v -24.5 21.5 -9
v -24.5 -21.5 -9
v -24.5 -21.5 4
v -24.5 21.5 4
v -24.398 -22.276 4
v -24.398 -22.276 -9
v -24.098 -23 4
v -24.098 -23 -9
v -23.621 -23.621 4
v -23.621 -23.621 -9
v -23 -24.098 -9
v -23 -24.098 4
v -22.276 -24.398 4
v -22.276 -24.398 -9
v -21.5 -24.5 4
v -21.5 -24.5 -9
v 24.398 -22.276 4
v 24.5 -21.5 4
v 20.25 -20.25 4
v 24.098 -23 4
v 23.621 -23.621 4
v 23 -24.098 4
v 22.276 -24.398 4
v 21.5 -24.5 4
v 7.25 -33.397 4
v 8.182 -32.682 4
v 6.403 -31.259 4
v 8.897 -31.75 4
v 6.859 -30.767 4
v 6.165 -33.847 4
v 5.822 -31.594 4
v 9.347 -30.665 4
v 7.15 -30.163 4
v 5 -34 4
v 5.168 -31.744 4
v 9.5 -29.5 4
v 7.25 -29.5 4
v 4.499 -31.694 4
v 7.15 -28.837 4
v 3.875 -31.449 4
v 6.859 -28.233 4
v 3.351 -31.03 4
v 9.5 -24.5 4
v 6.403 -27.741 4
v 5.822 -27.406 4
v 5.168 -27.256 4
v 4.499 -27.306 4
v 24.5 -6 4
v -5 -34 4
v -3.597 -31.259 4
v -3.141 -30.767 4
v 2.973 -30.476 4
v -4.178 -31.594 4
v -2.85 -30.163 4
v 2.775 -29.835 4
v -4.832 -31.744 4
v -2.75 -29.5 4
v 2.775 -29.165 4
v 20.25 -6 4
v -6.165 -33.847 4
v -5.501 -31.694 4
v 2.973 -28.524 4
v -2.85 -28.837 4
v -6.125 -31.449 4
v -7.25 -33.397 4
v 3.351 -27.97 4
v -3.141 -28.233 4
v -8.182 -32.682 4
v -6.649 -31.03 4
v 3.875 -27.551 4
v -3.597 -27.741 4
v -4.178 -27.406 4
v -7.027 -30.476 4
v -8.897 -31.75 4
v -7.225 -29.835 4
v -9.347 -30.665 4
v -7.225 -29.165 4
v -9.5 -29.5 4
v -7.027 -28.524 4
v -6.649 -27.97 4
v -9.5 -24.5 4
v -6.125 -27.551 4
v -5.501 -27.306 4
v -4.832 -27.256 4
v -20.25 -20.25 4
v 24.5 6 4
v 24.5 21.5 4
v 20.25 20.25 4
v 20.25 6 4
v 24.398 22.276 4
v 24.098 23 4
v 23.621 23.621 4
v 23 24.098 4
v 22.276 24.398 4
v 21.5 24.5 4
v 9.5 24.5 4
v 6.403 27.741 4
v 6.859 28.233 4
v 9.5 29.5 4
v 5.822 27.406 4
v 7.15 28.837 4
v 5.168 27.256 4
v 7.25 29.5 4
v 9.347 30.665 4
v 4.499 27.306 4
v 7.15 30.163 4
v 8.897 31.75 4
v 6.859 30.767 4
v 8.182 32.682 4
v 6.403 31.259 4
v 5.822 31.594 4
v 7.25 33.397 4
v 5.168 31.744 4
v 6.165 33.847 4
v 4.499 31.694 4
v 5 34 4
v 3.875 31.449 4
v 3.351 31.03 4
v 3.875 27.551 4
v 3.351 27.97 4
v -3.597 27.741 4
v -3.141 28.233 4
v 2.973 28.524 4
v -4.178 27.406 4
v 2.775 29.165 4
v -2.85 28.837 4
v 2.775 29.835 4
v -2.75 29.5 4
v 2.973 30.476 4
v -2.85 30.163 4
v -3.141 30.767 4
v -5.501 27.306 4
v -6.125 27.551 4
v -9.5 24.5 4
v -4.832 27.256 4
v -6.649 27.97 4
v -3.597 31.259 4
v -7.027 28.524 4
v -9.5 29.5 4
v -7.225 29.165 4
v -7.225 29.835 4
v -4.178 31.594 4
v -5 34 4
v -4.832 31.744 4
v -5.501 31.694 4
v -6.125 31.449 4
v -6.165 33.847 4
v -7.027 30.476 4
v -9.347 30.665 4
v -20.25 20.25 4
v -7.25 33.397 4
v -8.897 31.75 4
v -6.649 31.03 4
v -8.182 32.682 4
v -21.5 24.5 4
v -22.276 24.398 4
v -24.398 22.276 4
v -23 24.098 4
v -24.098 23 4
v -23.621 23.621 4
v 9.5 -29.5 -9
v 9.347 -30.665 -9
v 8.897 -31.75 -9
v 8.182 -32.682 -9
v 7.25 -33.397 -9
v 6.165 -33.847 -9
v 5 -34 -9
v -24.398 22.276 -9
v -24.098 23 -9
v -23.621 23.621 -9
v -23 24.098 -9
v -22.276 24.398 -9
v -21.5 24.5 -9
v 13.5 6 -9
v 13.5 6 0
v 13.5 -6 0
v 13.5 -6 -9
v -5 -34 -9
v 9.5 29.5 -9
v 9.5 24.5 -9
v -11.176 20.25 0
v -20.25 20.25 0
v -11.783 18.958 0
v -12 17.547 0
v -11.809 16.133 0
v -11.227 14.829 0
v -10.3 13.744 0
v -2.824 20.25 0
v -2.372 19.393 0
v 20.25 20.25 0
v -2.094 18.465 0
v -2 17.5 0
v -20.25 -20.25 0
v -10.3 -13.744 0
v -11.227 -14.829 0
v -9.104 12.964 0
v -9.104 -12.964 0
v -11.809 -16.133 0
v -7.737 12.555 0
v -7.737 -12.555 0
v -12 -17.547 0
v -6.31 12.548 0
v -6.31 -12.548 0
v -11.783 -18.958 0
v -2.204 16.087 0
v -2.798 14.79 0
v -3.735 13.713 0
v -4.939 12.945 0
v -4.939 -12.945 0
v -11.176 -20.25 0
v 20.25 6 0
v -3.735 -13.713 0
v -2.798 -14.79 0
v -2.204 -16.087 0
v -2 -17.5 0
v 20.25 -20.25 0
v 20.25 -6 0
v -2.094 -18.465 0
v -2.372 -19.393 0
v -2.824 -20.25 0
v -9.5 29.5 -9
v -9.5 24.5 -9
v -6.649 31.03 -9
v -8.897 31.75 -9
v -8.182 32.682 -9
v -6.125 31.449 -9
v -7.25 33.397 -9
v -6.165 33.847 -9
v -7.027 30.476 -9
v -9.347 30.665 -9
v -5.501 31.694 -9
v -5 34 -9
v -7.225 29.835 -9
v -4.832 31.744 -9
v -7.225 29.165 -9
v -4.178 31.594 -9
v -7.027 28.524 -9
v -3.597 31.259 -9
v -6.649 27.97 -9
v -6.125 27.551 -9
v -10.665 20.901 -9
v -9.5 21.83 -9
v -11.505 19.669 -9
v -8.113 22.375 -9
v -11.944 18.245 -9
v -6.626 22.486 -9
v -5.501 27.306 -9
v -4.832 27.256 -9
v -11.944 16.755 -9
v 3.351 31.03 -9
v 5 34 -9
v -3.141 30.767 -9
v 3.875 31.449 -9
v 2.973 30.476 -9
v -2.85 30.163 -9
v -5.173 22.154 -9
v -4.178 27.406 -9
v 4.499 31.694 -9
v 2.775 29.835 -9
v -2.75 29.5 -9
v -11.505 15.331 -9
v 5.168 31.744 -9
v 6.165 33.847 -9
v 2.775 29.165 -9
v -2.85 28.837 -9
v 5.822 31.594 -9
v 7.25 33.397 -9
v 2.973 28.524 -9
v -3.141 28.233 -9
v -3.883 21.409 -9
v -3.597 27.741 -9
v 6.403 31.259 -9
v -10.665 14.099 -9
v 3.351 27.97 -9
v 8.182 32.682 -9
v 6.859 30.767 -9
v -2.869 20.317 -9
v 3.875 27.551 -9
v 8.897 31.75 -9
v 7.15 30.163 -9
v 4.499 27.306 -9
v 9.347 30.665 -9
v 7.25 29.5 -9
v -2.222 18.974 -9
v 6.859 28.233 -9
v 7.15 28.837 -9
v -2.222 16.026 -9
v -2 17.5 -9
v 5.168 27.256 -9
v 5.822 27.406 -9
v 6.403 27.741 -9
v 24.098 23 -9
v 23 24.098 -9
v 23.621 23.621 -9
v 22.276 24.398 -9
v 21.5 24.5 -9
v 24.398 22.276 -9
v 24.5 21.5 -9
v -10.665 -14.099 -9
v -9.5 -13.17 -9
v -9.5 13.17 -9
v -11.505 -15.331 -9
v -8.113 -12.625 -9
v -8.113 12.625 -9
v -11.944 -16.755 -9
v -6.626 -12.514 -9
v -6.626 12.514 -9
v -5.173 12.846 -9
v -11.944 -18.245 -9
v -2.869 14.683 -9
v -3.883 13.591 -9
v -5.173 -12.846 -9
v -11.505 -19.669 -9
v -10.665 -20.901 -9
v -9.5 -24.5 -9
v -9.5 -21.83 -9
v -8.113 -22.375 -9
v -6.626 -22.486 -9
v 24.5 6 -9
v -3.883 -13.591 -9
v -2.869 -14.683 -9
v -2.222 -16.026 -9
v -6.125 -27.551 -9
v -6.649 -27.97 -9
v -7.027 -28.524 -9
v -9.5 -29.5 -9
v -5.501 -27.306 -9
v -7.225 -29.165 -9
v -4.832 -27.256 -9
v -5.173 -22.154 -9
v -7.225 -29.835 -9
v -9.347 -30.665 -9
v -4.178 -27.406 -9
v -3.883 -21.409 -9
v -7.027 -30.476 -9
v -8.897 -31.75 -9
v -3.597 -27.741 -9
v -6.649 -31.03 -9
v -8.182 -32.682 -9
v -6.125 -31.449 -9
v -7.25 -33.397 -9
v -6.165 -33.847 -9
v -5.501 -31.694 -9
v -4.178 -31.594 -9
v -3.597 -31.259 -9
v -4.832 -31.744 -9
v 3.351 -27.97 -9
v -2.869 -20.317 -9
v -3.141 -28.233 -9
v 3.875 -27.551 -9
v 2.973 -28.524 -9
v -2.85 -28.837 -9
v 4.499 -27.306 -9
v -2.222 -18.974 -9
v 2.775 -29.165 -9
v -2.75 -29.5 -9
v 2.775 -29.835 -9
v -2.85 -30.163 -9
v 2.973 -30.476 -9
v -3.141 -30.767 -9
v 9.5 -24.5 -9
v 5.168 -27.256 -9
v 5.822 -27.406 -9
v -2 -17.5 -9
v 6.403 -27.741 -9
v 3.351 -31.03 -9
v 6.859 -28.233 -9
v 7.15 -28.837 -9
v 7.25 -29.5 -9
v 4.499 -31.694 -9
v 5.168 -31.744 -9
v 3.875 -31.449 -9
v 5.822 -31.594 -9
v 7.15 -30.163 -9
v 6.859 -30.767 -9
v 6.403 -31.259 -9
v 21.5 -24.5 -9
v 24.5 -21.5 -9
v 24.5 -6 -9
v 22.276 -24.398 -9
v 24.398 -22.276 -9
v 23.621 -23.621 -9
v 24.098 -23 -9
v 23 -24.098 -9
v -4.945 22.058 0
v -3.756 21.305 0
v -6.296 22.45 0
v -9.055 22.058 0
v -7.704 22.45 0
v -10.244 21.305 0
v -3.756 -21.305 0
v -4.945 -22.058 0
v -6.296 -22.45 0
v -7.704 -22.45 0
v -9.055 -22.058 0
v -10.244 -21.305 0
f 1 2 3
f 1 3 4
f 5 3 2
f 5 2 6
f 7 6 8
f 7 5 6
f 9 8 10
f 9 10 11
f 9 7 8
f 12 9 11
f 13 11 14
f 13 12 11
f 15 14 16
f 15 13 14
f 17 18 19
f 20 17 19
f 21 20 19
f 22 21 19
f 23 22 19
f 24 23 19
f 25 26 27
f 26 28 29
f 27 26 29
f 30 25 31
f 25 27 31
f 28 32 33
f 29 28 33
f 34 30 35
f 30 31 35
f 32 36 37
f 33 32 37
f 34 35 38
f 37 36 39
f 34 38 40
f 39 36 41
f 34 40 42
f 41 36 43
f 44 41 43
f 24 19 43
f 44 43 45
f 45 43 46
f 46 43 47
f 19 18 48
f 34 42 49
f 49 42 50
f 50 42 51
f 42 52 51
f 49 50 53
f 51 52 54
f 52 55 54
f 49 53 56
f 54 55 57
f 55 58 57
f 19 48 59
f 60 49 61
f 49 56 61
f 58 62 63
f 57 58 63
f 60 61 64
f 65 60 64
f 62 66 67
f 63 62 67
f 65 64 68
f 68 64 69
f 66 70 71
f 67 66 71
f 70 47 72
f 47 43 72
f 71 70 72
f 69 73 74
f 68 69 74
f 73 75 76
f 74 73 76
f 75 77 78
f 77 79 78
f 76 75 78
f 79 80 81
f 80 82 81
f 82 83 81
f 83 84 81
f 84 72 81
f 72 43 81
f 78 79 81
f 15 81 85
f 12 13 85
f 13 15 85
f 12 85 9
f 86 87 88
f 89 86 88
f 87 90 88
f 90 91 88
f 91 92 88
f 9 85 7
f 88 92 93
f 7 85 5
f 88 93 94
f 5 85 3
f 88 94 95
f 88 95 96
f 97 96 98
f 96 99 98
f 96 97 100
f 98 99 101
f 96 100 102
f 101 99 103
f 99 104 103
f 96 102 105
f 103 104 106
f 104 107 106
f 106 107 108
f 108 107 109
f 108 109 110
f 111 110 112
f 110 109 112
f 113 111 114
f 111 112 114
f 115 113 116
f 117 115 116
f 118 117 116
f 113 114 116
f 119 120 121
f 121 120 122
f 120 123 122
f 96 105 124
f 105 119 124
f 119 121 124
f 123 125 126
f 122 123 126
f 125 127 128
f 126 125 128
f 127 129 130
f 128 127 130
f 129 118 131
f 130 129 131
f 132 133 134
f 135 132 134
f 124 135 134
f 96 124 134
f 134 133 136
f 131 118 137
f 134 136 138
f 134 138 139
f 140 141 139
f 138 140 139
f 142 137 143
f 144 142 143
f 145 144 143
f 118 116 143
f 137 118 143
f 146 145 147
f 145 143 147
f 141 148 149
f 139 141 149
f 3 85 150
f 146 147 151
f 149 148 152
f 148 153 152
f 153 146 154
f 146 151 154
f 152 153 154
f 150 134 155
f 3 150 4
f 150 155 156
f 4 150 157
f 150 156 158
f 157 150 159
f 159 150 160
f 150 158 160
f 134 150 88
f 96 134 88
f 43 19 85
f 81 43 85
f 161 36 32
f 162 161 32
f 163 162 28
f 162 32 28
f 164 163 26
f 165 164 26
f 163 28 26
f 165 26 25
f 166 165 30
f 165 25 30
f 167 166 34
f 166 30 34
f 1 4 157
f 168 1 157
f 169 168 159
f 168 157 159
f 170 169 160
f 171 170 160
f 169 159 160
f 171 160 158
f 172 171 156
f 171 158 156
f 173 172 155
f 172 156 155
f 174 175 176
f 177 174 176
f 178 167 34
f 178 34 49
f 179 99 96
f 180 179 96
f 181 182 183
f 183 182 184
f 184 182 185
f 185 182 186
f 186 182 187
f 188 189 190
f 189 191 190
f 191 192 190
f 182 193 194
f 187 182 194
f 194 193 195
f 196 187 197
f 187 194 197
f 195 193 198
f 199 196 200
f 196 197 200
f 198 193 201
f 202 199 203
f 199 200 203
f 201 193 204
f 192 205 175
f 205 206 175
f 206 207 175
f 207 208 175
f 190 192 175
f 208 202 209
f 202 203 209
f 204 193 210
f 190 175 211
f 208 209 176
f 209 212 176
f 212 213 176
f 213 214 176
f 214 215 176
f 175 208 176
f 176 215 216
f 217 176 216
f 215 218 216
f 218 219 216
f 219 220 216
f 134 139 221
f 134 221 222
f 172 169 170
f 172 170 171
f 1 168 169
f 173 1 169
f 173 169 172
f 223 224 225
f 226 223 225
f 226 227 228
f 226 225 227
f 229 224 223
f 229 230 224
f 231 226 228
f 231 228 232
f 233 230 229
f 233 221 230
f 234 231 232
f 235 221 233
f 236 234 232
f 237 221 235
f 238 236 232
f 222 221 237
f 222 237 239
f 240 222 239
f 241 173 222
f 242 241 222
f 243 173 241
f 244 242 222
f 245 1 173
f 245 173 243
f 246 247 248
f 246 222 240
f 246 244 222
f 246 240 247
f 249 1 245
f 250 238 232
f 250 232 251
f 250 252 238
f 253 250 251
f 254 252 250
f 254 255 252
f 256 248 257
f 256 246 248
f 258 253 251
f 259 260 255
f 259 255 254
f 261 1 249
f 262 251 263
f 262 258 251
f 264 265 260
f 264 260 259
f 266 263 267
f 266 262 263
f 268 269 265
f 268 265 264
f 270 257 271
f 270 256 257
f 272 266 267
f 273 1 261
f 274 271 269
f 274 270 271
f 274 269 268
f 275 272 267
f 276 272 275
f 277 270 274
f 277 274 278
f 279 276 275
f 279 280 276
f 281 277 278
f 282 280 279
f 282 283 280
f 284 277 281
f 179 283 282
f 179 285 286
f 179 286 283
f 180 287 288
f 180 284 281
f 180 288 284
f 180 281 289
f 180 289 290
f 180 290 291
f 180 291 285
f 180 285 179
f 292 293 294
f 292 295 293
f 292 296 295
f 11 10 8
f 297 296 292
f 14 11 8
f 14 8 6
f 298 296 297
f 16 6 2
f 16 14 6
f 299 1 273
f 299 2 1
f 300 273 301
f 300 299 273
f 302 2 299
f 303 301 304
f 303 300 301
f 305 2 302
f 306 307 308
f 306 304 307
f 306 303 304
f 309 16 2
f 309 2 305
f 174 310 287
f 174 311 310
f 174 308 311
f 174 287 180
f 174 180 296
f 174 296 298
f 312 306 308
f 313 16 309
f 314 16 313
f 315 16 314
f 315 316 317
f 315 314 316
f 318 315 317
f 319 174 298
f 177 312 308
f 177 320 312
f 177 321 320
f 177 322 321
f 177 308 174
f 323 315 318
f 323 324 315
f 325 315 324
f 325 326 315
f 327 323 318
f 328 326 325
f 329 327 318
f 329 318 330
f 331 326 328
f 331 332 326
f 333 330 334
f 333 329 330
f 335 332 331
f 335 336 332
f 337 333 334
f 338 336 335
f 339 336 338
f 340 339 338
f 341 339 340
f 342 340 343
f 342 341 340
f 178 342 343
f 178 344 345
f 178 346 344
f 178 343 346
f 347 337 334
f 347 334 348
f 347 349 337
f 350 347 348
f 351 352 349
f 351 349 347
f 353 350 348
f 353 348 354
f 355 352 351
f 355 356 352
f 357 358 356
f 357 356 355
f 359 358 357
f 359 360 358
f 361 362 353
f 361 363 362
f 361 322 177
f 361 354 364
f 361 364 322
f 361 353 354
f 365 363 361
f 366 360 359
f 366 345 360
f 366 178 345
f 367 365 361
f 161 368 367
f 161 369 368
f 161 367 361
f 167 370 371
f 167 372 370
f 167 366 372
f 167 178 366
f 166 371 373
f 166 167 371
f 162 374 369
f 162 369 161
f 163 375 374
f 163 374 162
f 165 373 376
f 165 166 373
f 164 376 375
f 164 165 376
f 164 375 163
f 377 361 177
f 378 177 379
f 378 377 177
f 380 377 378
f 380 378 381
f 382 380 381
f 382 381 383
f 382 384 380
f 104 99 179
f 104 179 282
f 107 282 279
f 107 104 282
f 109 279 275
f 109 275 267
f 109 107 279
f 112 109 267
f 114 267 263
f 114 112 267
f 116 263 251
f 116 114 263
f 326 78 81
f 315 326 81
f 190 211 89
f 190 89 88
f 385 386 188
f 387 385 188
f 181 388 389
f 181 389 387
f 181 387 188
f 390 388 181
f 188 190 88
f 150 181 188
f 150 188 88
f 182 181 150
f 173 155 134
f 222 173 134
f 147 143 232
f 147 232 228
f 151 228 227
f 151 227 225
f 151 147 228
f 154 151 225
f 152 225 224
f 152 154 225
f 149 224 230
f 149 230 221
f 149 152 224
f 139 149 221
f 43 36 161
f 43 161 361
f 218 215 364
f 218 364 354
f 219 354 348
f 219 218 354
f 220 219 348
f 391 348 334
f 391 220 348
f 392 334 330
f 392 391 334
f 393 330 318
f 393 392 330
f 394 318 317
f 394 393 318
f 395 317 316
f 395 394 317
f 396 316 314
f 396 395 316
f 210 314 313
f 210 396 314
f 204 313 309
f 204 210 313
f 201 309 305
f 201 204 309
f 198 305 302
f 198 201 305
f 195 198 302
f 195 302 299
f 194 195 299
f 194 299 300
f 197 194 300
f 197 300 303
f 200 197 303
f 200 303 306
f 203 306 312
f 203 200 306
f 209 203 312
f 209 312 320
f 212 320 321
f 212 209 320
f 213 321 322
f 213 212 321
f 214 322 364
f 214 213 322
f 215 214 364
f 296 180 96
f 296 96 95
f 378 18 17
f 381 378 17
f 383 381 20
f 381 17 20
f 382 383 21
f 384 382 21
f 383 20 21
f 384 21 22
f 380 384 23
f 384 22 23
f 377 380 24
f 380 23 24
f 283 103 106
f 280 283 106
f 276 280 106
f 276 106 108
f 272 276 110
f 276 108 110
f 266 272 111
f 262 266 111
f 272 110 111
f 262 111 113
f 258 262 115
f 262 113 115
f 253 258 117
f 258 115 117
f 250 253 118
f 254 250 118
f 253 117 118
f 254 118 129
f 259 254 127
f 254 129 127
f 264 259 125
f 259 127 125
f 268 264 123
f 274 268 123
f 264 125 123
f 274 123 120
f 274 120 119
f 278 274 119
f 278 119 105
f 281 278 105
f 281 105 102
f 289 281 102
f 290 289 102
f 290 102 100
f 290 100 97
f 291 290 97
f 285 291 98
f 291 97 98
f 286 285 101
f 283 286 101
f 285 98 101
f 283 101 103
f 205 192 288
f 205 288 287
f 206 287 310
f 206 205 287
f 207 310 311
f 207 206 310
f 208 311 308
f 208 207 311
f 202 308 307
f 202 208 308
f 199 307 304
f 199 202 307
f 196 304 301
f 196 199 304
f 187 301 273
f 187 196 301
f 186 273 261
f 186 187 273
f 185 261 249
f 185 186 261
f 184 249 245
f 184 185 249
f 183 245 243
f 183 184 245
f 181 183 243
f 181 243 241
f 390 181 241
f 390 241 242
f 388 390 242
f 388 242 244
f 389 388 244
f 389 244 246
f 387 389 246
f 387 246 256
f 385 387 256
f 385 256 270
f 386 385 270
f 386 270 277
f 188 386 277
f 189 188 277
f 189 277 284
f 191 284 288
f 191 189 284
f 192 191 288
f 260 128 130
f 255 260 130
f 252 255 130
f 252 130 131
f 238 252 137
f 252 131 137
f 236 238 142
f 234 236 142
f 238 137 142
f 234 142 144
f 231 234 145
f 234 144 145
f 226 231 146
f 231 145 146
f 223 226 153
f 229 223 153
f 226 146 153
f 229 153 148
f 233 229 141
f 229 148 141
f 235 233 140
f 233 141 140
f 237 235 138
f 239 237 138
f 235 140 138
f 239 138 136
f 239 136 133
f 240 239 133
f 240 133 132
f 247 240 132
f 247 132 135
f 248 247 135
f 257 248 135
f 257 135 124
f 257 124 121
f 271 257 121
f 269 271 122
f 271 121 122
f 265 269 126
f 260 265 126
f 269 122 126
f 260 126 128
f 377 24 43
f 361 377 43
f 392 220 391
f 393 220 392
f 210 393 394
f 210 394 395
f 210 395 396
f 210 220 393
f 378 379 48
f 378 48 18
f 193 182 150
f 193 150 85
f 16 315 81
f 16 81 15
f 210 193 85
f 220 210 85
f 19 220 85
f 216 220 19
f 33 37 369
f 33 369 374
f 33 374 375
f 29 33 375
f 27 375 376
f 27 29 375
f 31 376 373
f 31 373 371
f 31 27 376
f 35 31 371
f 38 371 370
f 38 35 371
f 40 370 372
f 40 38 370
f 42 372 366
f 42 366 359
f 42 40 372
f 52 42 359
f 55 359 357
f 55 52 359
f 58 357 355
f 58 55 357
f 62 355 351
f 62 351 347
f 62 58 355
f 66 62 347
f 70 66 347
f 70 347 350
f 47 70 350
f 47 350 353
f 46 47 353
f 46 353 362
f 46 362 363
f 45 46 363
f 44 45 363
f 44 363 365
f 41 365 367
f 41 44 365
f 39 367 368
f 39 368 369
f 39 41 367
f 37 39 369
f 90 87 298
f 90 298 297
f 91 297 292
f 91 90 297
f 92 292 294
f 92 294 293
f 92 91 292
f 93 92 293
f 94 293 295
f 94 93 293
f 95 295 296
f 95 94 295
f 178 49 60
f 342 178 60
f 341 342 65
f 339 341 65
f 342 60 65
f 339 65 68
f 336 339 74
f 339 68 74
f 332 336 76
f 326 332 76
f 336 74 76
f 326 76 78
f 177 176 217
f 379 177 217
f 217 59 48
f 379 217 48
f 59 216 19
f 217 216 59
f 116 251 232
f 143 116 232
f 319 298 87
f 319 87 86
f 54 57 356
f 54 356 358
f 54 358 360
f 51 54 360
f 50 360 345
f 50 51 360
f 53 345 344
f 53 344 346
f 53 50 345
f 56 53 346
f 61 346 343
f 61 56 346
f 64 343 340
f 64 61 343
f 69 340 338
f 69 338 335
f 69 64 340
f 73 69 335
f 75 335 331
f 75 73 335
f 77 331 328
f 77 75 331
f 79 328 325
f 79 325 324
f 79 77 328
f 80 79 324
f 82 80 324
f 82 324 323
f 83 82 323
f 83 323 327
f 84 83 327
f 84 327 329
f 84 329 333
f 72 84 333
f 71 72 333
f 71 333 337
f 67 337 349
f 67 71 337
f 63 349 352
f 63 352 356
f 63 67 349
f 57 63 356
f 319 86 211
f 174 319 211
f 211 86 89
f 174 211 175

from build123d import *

# Parameters (mm, degrees)
SKETCH006_R                = 5
PAD005_DEPTH               = 9
PAD006_DEPTH               = 4
SKETCH009_R                = 2.25
PAD008_DEPTH               = 13
POCKET_DEPTH               = 13
POCKET_MIRRORED004_2_DEPTH = 13


with BuildPart() as part:
    # Sketch006 (on Face30 of Binder) → Pad005 (new body)
    with BuildSketch(Plane(origin=(0, 0, 0), x_dir=(1, 0, 0), z_dir=(0, 0, -1))):
        Polygon((-24.5, -24.5), (24.5, -24.5), (24.5, -6), (13.5, -6), (13.5, 6), (24.5, 6), (24.5, 24.5), (-24.5, 24.5), align=None)
        with Locations((-7, 17.5)):
            Circle(SKETCH006_R, mode=Mode.SUBTRACT)
        with Locations((-7, -17.5)):
            Circle(SKETCH006_R, mode=Mode.SUBTRACT)
    extrude(amount=PAD005_DEPTH)

    # Sketch007 (on Face11 of Pad005) → Pad006 (join)
    with BuildSketch(Plane.XY):
        Polygon((-20.25, 20.25), (-20.25, -20.25), (20.25, -20.25), (20.25, -6), (24.5, -6), (24.5, -24.5), (-24.5, -24.5), (-24.5, 24.5), (24.5, 24.5), (24.5, 6), (20.25, 6), (20.25, 20.25), align=None)
    extrude(amount=PAD006_DEPTH)

    # Sketch009 (on Face7 of Pad006) → Pad008 (join)
    with BuildSketch(Plane.XY.offset(4)):
        with BuildLine():
            ThreePointArc((-5, 34), (-8.18198, 32.681981), (-9.5, 29.5))
            Line((-9.5, 29.5), (-9.5, 24.5))
            Line((-9.5, 24.5), (9.5, 24.5))
            Line((9.5, 29.5), (9.5, 24.5))
            ThreePointArc((9.5, 29.5), (8.181981, 32.681981), (5, 34))
            Line((5, 34), (-5, 34))
        make_face()
        with Locations((5, 29.5)):
            Circle(SKETCH009_R, mode=Mode.SUBTRACT)
        with Locations((-5, 29.5)):
            Circle(SKETCH009_R, mode=Mode.SUBTRACT)
    pad008 = extrude(amount=-PAD008_DEPTH)

    # Mirrored001: Pad008 across Sketch009 H_Axis
    add(pad008.mirror(Plane(origin=(0, 0, 4), x_dir=(0, 0, 1), z_dir=(0, 1, 0))))

    # Sketch018 (on Face36 of Mirrored001) → Pocket (cut)
    with BuildSketch(Plane.XY.offset(4)):
        with BuildLine():
            ThreePointArc((-24.5, -21.5), (-23.62132, -23.62132), (-21.5, -24.5))
            Line((-21.5, -24.5), (-24.5, -24.5))
            Line((-24.5, -24.5), (-24.5, -21.5))
        make_face()
    pocket = extrude(amount=-POCKET_DEPTH, mode=Mode.SUBTRACT)

    # Sketch018 Mirrored004 2 → Pocket Mirrored004 2 (cut)
    with BuildSketch(Plane(origin=(0, 0, 4), x_dir=(1, 0, 0), z_dir=(0, 0, -1))):
        with BuildLine():
            ThreePointArc((-24.5, -21.5), (-23.62132, -23.62132), (-21.5, -24.5))
            Line((-21.5, -24.5), (-24.5, -24.5))
            Line((-24.5, -24.5), (-24.5, -21.5))
        make_face()
    pocket_mirrored004_2 = extrude(amount=POCKET_MIRRORED004_2_DEPTH, mode=Mode.SUBTRACT)

    # Mirrored005: Pocket, Pocket Mirrored004 2 across Sketch018 V_Axis
    add(pocket.mirror(Plane(origin=(0, 0, 4), x_dir=(0, 0, 1), z_dir=(1, 0, 0))), mode=Mode.SUBTRACT)
    add(pocket_mirrored004_2.mirror(Plane(origin=(0, 0, 4), x_dir=(0, 0, 1), z_dir=(1, 0, 0))), mode=Mode.SUBTRACT)


solid = part.part
